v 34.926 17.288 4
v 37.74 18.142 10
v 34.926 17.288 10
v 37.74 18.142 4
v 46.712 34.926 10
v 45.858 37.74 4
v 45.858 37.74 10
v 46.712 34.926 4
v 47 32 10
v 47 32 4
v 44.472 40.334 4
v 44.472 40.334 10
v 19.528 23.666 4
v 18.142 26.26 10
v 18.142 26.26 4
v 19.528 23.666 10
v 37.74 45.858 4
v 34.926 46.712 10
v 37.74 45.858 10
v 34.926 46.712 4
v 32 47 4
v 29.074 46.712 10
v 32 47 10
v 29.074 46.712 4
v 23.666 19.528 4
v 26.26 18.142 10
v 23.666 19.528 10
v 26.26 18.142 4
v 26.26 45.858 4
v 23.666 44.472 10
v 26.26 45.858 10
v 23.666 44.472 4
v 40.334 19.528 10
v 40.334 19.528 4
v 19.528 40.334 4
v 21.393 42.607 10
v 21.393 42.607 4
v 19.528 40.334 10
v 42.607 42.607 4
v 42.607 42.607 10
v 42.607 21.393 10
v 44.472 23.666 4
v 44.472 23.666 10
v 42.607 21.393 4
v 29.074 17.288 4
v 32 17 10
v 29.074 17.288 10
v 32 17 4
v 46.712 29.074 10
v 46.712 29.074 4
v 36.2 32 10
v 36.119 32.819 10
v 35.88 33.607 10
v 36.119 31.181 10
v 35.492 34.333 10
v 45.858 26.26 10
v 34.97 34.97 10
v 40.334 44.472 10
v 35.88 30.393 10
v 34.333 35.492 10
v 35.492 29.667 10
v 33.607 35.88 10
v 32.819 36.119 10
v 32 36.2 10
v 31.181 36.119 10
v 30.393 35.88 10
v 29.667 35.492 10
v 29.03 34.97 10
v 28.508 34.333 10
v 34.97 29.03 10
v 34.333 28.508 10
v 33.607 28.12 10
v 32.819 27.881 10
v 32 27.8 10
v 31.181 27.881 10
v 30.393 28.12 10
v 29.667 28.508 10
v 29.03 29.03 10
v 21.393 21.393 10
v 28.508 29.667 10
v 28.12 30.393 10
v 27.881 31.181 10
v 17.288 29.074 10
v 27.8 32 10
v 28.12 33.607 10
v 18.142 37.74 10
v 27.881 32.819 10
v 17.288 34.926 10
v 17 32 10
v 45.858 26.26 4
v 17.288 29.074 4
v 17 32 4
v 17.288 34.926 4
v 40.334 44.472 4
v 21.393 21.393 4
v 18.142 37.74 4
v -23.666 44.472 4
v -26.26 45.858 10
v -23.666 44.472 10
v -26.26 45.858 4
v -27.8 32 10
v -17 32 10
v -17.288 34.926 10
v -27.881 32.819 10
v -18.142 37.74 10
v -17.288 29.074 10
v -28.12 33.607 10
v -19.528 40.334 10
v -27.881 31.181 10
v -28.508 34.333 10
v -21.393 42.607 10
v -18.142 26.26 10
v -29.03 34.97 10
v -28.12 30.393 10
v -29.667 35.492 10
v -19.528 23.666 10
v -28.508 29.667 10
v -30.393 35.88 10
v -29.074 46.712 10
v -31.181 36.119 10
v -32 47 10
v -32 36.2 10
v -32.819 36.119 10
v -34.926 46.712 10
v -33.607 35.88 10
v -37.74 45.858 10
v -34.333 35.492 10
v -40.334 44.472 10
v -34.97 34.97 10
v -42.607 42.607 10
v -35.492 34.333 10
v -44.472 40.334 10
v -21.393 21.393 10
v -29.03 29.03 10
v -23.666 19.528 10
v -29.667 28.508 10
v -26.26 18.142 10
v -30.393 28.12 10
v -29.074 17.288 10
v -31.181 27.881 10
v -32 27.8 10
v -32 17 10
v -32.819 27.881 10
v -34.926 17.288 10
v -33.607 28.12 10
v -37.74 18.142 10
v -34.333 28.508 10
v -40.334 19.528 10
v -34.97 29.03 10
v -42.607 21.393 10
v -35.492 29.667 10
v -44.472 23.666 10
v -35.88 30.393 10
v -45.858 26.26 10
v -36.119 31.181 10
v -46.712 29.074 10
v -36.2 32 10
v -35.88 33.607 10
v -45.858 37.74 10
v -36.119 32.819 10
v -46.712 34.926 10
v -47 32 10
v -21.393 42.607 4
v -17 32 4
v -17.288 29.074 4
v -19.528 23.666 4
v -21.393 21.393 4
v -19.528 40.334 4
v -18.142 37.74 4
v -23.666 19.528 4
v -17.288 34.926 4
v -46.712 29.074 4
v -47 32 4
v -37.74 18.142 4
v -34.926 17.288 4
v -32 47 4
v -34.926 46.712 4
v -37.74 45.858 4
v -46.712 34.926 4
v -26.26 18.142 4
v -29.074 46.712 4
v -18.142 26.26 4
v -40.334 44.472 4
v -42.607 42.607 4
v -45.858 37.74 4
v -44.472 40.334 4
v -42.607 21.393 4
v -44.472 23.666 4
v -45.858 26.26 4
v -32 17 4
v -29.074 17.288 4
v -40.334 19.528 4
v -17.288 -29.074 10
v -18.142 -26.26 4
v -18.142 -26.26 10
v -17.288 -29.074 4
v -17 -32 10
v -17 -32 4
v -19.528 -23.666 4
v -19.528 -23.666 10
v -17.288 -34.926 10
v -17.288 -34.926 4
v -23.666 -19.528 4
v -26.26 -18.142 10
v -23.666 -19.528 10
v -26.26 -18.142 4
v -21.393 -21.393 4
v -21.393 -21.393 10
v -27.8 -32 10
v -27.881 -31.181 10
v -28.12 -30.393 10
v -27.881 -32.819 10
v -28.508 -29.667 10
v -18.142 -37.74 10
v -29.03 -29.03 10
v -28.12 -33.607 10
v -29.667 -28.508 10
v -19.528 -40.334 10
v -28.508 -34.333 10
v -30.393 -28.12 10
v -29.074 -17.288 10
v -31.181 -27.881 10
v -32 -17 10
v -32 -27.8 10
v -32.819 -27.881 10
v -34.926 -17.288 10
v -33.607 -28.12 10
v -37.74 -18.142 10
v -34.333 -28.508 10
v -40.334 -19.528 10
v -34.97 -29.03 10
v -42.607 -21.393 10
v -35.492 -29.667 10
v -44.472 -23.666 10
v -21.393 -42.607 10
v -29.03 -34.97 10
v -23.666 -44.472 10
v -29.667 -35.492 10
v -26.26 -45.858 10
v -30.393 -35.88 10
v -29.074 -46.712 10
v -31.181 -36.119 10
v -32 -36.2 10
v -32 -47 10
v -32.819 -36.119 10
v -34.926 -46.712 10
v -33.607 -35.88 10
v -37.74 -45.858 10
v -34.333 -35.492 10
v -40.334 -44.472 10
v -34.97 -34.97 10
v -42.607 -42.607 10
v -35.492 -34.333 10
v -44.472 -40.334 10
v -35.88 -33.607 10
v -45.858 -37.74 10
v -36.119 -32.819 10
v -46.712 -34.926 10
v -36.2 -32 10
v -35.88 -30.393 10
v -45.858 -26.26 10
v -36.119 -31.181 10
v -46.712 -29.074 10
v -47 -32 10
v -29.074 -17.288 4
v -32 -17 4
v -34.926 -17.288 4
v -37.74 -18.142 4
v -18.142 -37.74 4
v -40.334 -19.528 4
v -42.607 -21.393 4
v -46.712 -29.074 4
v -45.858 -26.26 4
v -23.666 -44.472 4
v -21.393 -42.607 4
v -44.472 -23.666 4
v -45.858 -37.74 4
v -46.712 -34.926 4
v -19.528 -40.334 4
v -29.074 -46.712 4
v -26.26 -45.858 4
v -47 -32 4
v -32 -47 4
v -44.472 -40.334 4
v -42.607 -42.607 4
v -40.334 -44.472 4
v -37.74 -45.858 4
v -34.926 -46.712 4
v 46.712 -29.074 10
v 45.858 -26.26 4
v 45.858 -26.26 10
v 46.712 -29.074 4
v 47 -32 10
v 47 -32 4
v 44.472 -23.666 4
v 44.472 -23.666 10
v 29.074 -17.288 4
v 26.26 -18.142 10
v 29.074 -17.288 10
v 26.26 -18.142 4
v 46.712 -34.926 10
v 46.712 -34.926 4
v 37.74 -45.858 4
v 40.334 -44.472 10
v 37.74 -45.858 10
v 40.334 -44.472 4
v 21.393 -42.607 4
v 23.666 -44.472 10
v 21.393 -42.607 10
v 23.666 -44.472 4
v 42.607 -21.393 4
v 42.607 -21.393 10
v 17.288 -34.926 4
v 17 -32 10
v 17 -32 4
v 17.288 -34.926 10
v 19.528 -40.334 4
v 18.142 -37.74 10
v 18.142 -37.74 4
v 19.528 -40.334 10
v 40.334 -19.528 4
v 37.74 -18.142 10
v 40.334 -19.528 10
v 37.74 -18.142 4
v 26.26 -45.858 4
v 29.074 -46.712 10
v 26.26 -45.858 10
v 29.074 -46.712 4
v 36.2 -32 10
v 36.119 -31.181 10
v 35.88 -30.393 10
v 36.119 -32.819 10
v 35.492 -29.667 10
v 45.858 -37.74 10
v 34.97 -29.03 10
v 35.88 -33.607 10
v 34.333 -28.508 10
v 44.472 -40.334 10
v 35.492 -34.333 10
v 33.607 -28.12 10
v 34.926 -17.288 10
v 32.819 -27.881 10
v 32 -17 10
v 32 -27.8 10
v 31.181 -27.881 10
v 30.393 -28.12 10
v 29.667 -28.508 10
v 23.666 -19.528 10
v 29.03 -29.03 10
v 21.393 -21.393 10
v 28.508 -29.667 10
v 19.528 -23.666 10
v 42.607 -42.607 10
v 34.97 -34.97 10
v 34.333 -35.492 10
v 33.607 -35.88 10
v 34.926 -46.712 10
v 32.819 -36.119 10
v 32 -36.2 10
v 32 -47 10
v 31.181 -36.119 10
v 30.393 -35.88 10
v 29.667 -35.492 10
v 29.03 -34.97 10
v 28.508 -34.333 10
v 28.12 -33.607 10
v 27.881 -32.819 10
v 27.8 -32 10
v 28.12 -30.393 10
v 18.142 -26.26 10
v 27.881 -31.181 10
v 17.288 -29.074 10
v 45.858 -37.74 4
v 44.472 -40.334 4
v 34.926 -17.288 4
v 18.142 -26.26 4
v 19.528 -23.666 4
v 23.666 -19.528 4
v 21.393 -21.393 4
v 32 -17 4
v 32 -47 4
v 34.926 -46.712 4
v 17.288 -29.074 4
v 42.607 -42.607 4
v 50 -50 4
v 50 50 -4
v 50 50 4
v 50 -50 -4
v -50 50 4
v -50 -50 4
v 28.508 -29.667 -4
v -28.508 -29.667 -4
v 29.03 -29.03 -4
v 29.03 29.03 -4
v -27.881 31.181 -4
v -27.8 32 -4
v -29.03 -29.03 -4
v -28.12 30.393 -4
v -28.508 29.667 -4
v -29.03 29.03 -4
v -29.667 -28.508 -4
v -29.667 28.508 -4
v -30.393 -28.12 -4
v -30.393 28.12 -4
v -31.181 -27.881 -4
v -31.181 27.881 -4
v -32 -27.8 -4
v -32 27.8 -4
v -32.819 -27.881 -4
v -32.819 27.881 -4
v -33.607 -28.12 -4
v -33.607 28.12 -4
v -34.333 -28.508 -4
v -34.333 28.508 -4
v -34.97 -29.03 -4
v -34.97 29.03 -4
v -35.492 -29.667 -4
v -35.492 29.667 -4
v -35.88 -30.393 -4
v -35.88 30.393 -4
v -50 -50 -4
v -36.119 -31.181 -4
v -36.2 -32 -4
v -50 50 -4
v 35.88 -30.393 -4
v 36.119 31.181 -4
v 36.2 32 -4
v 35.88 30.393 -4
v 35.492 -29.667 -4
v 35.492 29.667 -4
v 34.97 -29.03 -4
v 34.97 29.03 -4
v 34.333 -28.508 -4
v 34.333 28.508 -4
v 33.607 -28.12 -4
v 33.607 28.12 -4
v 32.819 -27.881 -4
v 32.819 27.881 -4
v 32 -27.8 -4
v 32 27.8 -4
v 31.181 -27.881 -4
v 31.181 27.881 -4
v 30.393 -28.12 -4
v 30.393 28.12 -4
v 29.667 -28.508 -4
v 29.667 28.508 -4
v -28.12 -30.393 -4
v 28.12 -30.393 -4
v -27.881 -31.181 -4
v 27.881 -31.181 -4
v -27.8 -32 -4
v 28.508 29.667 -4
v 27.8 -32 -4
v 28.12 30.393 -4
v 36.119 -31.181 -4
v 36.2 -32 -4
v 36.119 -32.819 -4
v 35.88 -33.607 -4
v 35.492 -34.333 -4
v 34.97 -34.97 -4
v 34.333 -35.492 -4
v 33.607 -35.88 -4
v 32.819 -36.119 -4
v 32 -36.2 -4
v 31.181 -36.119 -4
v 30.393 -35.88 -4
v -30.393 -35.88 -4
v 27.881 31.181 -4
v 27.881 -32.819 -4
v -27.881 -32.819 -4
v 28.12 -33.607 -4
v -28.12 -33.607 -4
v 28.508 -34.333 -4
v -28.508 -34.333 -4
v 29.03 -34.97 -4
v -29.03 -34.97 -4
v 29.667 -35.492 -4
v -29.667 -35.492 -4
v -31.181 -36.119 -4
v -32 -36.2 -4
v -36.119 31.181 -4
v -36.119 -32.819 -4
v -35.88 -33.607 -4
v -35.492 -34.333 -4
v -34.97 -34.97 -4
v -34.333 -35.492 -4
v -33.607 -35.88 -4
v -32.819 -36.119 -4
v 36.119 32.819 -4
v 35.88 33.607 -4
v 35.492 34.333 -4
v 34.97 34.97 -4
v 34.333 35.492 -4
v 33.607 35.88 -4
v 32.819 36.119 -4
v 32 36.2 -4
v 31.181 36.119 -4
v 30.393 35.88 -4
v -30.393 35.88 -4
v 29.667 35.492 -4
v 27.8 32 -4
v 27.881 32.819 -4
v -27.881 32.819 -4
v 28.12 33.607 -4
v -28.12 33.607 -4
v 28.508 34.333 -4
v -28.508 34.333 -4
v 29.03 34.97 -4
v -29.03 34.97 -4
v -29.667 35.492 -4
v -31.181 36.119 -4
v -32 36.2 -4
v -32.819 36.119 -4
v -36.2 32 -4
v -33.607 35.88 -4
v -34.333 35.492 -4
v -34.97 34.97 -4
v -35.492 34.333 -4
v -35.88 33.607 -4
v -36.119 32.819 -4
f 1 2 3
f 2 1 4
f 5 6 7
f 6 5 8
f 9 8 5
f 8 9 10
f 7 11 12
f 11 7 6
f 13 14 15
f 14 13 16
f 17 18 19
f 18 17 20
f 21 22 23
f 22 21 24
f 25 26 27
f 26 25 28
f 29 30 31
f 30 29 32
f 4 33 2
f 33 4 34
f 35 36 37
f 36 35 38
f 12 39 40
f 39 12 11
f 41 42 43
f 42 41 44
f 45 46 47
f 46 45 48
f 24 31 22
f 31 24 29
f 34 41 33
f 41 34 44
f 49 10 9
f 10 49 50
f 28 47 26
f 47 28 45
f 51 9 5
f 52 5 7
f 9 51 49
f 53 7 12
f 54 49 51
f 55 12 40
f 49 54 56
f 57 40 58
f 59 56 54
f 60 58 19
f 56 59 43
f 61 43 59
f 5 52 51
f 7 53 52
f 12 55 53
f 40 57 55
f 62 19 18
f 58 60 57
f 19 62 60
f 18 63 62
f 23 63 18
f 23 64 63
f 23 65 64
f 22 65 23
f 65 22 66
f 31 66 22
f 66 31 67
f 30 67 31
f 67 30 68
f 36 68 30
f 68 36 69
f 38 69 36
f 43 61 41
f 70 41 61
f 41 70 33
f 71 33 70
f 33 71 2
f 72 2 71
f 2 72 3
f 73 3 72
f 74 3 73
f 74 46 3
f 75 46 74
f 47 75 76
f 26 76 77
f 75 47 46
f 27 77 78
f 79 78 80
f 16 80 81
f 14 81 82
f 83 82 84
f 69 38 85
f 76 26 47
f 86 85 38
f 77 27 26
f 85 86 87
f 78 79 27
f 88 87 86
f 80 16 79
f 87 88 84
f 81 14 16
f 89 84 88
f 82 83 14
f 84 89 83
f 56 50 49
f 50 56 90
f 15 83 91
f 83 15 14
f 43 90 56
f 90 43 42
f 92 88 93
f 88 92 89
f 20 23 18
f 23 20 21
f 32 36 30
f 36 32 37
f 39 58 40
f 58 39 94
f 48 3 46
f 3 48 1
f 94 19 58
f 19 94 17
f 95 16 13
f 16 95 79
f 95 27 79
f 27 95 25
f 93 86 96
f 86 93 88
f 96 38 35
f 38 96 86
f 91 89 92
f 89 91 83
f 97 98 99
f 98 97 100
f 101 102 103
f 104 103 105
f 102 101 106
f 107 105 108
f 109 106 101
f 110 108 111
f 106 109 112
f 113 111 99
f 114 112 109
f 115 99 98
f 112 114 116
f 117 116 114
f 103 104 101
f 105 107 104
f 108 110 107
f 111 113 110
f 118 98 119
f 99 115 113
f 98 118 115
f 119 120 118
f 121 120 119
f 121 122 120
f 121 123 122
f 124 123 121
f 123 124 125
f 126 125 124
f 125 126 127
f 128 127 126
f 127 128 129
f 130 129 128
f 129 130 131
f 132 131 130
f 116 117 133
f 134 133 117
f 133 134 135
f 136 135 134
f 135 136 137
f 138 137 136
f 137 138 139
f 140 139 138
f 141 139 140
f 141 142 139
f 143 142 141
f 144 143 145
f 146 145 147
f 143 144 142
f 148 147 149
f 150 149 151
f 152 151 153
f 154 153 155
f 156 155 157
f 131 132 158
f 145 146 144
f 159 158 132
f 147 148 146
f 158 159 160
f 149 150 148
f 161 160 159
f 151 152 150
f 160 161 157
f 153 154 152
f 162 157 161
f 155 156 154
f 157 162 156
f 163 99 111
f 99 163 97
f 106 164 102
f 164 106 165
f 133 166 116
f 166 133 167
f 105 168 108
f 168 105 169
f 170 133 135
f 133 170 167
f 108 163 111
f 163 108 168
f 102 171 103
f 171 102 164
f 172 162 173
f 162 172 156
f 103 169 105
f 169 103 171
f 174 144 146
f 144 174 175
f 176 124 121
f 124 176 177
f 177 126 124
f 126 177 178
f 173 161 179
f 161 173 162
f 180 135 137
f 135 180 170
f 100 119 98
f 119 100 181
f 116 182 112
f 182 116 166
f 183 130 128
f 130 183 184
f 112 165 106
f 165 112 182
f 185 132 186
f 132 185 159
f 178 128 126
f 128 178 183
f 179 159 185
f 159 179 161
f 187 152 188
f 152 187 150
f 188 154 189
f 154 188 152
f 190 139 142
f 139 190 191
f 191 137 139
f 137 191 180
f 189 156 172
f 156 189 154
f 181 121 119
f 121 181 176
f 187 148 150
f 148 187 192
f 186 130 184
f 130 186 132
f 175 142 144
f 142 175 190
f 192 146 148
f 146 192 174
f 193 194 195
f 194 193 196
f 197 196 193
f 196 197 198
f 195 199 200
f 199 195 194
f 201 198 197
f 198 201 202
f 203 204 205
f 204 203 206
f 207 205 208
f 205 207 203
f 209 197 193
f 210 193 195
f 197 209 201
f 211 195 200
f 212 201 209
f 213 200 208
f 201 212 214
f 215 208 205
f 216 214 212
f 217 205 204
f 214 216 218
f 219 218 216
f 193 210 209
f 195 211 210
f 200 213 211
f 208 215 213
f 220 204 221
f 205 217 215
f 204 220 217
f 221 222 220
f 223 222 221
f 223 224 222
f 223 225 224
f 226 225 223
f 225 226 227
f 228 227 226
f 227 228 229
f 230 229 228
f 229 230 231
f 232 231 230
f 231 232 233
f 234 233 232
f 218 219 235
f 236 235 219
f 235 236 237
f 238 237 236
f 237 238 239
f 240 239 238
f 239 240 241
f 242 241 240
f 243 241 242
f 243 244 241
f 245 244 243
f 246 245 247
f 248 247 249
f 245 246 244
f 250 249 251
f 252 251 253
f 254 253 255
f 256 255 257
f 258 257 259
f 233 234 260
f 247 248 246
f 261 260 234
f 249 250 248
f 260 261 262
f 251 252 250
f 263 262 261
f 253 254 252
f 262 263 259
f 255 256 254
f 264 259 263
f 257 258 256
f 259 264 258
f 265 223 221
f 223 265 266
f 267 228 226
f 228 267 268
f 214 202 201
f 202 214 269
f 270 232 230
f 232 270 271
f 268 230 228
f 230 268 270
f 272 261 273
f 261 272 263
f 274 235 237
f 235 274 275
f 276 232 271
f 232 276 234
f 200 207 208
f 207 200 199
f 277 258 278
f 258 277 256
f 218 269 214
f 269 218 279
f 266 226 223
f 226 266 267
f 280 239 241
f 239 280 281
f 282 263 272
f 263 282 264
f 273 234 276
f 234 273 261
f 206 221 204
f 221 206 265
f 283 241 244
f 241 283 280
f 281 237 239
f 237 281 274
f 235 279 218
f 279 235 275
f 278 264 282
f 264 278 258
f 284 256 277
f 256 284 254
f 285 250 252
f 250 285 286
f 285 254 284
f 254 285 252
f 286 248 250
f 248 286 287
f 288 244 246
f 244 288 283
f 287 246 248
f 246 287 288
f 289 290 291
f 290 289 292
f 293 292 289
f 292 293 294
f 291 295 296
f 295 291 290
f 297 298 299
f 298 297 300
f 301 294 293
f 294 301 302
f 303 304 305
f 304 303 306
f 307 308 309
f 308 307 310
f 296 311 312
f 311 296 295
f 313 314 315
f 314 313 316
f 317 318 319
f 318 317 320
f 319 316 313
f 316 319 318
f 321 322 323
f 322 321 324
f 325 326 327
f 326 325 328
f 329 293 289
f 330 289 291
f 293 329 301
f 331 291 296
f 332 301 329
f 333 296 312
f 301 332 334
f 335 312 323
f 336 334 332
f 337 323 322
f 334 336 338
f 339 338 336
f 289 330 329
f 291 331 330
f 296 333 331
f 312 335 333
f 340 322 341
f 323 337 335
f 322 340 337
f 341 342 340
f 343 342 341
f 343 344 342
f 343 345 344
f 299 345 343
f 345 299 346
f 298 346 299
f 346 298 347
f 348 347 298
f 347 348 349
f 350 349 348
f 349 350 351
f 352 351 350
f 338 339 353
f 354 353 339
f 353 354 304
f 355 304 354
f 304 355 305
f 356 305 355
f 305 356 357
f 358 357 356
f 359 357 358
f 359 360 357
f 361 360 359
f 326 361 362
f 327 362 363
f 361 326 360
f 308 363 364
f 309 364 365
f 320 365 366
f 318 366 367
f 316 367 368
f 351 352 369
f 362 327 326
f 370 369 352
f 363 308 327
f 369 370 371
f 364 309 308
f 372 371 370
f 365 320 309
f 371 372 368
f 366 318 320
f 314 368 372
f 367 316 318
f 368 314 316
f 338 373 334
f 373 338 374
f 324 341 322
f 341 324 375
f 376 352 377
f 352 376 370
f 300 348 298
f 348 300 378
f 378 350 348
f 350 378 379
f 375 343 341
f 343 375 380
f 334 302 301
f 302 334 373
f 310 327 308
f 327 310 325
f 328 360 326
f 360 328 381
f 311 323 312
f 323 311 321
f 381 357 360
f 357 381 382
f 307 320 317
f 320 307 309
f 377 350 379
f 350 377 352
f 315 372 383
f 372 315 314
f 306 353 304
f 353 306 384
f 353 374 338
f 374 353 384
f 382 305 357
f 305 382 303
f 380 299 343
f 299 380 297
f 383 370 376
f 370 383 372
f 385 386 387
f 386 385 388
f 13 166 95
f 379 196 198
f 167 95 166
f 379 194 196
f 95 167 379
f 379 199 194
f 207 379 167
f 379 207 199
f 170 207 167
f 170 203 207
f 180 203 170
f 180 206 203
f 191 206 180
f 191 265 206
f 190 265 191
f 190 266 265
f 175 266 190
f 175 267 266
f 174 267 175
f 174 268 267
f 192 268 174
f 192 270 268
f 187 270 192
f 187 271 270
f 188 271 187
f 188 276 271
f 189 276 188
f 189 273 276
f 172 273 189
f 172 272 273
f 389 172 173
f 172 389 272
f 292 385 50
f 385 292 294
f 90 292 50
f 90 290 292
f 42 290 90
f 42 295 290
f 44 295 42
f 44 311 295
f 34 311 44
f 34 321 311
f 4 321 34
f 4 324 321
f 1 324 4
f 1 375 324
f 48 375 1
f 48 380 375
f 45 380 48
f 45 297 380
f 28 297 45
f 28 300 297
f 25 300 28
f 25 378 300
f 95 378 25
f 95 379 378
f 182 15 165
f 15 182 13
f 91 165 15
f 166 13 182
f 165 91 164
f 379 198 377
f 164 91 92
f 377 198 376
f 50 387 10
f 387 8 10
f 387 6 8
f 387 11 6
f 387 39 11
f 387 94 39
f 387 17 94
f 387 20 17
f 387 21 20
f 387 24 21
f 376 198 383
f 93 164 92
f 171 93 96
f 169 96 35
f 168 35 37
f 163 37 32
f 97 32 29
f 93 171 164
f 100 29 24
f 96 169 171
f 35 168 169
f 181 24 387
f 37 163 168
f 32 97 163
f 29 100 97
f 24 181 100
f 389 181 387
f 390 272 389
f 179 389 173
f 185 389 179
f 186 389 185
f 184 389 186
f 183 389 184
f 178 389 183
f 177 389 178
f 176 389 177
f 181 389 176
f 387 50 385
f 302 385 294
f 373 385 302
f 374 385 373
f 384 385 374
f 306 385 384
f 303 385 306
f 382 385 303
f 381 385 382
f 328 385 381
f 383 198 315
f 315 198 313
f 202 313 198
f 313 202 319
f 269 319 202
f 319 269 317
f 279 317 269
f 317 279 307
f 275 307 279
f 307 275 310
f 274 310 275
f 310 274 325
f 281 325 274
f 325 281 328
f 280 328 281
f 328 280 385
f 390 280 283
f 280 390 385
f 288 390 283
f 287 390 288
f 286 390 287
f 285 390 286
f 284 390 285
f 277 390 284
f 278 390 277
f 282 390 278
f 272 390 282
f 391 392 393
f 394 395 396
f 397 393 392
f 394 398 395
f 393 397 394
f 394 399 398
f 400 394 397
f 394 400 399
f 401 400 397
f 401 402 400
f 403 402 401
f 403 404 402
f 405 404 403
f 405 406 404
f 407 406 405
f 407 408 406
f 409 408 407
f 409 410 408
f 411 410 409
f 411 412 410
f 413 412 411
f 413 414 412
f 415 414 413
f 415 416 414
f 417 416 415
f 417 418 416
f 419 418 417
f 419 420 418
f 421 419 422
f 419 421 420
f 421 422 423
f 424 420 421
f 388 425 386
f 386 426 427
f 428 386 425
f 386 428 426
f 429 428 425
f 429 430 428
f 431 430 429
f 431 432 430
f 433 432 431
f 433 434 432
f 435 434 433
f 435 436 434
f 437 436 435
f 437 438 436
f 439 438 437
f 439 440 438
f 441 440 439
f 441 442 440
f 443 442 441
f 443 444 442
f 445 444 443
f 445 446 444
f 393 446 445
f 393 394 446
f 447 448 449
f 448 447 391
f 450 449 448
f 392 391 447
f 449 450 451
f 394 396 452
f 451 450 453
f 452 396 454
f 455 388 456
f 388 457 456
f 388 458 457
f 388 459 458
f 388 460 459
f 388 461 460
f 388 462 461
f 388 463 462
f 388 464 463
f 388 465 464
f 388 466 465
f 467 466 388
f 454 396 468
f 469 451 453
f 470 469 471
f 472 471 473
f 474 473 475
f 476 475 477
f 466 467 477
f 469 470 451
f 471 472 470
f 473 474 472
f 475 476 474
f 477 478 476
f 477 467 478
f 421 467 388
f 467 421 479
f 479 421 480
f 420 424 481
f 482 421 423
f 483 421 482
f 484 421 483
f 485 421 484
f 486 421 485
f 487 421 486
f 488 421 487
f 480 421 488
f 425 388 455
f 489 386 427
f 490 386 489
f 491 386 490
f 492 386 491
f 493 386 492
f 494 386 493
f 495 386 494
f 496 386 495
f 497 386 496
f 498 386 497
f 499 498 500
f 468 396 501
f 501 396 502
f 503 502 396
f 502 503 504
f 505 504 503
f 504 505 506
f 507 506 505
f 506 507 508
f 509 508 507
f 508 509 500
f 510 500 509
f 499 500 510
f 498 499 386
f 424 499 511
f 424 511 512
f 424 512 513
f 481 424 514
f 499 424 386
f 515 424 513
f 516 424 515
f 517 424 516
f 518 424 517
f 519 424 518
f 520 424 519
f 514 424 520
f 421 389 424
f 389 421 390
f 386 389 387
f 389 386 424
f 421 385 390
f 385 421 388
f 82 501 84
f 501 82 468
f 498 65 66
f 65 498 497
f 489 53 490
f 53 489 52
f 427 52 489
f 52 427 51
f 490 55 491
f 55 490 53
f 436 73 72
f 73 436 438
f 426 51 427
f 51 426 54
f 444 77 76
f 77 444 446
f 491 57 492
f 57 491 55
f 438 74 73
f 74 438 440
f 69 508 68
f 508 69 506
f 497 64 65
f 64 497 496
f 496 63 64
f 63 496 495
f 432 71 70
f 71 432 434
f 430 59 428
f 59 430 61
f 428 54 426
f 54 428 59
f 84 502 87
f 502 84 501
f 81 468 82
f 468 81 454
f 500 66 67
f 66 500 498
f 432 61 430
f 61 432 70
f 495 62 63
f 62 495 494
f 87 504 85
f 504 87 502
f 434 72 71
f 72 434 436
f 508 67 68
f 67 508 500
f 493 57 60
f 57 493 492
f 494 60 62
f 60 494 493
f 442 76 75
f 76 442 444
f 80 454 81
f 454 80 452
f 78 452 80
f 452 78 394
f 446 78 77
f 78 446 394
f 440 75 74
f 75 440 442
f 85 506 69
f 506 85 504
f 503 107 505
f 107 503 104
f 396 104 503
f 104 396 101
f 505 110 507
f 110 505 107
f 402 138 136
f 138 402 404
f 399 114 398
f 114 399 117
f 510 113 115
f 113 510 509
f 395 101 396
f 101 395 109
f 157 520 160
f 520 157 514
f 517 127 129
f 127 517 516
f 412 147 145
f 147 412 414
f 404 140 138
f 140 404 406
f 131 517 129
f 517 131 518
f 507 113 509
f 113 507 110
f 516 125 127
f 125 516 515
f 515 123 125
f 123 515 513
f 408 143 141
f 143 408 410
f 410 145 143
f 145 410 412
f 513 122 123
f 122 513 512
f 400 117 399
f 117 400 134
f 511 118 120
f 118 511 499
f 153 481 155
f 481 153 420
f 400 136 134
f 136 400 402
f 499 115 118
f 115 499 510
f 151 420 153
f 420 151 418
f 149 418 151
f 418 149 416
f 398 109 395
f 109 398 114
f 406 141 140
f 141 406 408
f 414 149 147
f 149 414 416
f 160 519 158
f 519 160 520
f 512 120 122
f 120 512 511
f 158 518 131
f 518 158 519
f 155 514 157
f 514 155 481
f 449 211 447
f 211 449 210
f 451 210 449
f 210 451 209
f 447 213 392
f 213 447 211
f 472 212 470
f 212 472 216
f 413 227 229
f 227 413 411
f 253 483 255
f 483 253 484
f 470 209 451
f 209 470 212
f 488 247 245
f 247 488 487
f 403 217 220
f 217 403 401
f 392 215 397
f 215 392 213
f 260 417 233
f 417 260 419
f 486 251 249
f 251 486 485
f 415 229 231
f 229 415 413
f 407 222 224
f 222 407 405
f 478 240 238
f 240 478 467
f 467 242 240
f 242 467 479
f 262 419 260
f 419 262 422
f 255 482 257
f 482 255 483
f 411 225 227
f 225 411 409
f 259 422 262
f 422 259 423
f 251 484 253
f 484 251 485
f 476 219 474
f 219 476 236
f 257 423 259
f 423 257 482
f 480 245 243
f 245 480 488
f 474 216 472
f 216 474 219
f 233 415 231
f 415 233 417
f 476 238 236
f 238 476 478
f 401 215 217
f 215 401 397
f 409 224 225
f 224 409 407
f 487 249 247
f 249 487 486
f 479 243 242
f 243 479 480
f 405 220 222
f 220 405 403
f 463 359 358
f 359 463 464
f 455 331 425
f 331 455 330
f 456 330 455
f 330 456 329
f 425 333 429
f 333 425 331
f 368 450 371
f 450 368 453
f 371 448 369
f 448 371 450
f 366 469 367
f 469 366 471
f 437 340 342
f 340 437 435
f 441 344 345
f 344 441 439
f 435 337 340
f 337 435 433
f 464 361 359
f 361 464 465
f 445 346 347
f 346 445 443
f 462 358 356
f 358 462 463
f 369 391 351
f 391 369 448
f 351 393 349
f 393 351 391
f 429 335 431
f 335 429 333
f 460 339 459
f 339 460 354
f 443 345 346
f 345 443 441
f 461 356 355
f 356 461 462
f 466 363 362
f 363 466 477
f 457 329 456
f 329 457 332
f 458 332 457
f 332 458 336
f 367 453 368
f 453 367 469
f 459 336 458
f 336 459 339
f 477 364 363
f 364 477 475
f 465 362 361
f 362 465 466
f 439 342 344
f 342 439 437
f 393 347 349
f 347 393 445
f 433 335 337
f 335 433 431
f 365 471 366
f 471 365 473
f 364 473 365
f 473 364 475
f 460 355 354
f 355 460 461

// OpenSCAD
$fn = 32;

// ----------------------------------------------------------------------
// Anchor pads 100 x 100 x 14
// four corner bosses with anchor holes
// ----------------------------------------------------------------------

// --- parameters (mm) ---
plate = [100, 100, 8];  // base plate size (x, y, z)
pads = 4;               // boss count, one per corner
edge = 18;              // boss centre offset from the plate edge
boss_d = 30;            // boss diameter
boss_h = 6;             // boss height above the base plate
hole_d = 8.4;           // hole diameter

// --- derived feature positions (mm) ---
height = plate[2] + boss_h;      // = 14   overall height of the part
corner_x = plate[0] / 2 - edge;  // = 32   boss centre X
corner_y = plate[1] / 2 - edge;  // = 32   boss centre Y
feature_centers = [
  [corner_x, corner_y],
  [-corner_x, corner_y],
  [-corner_x, -corner_y],
  [corner_x, -corner_y]
];   // boss centres, anchor holes are drilled there

// base plate, four bosses standing on it, anchor holes all the way through
difference() {
  union() {
    cube(plate, center = true);
    for (centre = feature_centers)
      translate([centre[0], centre[1], plate[2] / 2 - 1])
        cylinder(d = boss_d, h = boss_h + 1);
  }
  for (centre = feature_centers)
    translate([centre[0], centre[1], -height])
      cylinder(d = hole_d, h = 2 * height + 2);  // through boss and plate
}
